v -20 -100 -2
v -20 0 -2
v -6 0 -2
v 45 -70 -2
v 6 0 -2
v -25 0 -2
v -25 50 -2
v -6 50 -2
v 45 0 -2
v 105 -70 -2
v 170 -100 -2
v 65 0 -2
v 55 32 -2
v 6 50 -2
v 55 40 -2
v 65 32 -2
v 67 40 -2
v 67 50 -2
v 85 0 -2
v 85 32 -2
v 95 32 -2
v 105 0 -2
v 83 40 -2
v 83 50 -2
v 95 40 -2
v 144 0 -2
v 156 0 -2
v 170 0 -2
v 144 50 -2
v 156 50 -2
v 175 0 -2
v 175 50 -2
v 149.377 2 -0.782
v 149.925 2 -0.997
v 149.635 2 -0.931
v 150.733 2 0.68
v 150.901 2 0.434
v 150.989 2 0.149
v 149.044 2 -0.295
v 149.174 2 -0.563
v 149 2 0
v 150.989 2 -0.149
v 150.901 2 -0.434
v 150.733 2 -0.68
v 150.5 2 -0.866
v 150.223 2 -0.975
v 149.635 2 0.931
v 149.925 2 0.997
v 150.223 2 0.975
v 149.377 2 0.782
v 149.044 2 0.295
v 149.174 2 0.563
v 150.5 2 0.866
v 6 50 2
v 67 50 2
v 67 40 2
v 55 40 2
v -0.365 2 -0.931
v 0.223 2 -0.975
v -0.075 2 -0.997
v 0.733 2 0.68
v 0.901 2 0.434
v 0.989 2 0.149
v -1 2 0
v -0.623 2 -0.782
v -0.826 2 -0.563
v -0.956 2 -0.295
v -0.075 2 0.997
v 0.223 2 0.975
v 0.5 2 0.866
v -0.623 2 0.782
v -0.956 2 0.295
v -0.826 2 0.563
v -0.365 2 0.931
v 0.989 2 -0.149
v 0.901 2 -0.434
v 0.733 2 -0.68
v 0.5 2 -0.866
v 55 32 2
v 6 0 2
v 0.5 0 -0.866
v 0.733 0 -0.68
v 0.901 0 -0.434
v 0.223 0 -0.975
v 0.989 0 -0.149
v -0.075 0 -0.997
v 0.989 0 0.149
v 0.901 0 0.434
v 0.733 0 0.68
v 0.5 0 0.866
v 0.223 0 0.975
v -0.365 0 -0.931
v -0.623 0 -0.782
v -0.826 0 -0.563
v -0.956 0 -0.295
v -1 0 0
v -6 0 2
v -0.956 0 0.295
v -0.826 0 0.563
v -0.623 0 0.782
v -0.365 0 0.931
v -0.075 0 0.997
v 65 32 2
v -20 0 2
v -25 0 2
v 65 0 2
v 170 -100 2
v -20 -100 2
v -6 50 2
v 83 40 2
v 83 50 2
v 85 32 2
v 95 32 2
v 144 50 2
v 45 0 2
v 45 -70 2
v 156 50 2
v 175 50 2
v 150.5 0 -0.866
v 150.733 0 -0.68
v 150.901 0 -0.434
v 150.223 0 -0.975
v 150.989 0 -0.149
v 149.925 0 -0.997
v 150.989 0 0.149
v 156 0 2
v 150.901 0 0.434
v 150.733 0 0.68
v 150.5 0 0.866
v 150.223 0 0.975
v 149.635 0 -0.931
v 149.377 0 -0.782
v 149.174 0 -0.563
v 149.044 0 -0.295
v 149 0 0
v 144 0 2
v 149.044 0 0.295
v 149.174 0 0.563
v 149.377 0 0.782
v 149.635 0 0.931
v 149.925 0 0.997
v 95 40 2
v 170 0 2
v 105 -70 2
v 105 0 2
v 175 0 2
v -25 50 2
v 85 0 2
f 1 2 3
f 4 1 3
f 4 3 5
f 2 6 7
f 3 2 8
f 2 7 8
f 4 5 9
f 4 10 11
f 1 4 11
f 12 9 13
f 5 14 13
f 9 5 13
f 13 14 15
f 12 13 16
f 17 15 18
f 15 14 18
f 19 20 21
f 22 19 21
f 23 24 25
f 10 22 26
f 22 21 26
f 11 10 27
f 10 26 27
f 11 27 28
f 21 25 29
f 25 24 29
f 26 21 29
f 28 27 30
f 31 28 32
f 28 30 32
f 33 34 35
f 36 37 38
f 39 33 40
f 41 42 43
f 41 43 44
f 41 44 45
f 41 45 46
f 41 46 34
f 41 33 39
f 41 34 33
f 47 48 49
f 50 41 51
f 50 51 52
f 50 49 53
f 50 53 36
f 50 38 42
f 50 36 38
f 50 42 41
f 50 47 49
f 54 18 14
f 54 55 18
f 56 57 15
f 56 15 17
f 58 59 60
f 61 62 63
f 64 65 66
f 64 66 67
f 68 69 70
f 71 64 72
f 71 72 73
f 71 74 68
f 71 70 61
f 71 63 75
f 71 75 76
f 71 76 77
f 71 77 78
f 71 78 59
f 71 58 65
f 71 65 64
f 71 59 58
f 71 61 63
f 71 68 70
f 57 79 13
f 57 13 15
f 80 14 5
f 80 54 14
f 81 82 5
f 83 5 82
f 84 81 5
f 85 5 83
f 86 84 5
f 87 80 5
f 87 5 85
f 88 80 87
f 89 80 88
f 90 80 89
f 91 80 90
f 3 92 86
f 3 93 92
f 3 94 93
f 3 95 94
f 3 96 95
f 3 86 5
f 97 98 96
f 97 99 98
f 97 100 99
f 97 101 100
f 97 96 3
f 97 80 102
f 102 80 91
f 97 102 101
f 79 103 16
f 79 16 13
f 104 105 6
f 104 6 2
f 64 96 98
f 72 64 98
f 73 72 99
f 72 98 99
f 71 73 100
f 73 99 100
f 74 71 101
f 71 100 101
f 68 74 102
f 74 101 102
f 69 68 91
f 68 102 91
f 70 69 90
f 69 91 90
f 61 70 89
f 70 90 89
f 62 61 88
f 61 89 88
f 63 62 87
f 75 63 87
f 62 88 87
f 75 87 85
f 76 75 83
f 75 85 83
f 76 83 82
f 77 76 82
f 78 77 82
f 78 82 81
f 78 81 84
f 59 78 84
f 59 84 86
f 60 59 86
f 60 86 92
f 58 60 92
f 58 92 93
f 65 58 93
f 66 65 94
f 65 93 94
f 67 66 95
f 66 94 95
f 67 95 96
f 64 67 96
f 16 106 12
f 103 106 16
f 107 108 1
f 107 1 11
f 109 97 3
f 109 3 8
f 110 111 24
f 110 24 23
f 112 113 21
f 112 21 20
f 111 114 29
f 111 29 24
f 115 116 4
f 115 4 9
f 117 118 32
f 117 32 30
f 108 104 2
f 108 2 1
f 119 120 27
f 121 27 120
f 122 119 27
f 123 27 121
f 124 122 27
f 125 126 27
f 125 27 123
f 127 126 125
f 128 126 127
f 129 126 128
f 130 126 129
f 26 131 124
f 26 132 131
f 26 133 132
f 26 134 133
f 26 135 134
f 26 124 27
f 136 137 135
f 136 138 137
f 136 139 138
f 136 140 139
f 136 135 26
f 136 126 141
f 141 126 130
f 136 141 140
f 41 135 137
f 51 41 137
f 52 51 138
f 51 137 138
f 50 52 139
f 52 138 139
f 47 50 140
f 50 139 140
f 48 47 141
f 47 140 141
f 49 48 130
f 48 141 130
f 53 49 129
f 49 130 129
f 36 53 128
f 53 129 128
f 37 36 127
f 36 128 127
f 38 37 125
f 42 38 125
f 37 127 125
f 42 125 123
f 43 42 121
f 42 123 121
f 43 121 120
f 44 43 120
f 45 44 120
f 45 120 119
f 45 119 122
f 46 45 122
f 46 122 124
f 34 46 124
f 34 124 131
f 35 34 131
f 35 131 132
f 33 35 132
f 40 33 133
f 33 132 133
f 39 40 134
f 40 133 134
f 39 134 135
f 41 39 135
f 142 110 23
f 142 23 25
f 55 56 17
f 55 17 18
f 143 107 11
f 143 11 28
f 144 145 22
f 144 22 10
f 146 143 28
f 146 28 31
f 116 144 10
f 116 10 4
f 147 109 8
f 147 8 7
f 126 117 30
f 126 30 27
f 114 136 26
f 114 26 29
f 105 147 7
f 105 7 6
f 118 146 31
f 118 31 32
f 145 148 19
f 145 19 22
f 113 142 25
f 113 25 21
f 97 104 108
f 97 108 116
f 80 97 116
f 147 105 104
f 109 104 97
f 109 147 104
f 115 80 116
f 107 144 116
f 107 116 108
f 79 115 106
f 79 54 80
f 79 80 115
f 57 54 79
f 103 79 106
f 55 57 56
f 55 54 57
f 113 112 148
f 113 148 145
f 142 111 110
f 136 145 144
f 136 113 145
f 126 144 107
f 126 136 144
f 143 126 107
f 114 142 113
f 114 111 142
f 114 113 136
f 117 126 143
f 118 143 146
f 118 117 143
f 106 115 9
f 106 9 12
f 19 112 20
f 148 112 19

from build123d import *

# Parameters (mm, degrees)
F1_DEPTH      = 2
F1_DEPTH_BACK = 2
F2_R          = 1
F3_DEPTH      = 2


with BuildPart() as f1:
    # F0 (on Top) → F1 (new body, two sides)
    with BuildSketch(Plane.XY) as f1_sk:
        Polygon((6, 0), (-6, 0), (-6, 50), (-25, 50), (-25, 0), (-20, 0), (-20, -100), (170, -100), (170, 0), (175, 0), (175, 50), (156, 50), (156, 0), (144, 0), (144, 50), (83, 50), (83, 40), (95, 40), (95, 32), (85, 32), (85, 0), (105, 0), (105, -70), (45, -70), (45, 0), (65, 0), (65, 32), (55, 32), (55, 40), (67, 40), (67, 50), (6, 50), align=None)
    extrude(amount=F1_DEPTH)
    extrude(f1_sk.sketch, amount=-F1_DEPTH_BACK)

    # F2 (on face) → F3 (join)
    with BuildSketch(Plane(origin=(0, 0, 0), x_dir=(-1, 0, 0), z_dir=(0, 1, 0))):
        with Locations((-150, 0)):
            Circle(F2_R)
        Circle(F2_R)
    extrude(amount=F3_DEPTH)


solid = f1.part
